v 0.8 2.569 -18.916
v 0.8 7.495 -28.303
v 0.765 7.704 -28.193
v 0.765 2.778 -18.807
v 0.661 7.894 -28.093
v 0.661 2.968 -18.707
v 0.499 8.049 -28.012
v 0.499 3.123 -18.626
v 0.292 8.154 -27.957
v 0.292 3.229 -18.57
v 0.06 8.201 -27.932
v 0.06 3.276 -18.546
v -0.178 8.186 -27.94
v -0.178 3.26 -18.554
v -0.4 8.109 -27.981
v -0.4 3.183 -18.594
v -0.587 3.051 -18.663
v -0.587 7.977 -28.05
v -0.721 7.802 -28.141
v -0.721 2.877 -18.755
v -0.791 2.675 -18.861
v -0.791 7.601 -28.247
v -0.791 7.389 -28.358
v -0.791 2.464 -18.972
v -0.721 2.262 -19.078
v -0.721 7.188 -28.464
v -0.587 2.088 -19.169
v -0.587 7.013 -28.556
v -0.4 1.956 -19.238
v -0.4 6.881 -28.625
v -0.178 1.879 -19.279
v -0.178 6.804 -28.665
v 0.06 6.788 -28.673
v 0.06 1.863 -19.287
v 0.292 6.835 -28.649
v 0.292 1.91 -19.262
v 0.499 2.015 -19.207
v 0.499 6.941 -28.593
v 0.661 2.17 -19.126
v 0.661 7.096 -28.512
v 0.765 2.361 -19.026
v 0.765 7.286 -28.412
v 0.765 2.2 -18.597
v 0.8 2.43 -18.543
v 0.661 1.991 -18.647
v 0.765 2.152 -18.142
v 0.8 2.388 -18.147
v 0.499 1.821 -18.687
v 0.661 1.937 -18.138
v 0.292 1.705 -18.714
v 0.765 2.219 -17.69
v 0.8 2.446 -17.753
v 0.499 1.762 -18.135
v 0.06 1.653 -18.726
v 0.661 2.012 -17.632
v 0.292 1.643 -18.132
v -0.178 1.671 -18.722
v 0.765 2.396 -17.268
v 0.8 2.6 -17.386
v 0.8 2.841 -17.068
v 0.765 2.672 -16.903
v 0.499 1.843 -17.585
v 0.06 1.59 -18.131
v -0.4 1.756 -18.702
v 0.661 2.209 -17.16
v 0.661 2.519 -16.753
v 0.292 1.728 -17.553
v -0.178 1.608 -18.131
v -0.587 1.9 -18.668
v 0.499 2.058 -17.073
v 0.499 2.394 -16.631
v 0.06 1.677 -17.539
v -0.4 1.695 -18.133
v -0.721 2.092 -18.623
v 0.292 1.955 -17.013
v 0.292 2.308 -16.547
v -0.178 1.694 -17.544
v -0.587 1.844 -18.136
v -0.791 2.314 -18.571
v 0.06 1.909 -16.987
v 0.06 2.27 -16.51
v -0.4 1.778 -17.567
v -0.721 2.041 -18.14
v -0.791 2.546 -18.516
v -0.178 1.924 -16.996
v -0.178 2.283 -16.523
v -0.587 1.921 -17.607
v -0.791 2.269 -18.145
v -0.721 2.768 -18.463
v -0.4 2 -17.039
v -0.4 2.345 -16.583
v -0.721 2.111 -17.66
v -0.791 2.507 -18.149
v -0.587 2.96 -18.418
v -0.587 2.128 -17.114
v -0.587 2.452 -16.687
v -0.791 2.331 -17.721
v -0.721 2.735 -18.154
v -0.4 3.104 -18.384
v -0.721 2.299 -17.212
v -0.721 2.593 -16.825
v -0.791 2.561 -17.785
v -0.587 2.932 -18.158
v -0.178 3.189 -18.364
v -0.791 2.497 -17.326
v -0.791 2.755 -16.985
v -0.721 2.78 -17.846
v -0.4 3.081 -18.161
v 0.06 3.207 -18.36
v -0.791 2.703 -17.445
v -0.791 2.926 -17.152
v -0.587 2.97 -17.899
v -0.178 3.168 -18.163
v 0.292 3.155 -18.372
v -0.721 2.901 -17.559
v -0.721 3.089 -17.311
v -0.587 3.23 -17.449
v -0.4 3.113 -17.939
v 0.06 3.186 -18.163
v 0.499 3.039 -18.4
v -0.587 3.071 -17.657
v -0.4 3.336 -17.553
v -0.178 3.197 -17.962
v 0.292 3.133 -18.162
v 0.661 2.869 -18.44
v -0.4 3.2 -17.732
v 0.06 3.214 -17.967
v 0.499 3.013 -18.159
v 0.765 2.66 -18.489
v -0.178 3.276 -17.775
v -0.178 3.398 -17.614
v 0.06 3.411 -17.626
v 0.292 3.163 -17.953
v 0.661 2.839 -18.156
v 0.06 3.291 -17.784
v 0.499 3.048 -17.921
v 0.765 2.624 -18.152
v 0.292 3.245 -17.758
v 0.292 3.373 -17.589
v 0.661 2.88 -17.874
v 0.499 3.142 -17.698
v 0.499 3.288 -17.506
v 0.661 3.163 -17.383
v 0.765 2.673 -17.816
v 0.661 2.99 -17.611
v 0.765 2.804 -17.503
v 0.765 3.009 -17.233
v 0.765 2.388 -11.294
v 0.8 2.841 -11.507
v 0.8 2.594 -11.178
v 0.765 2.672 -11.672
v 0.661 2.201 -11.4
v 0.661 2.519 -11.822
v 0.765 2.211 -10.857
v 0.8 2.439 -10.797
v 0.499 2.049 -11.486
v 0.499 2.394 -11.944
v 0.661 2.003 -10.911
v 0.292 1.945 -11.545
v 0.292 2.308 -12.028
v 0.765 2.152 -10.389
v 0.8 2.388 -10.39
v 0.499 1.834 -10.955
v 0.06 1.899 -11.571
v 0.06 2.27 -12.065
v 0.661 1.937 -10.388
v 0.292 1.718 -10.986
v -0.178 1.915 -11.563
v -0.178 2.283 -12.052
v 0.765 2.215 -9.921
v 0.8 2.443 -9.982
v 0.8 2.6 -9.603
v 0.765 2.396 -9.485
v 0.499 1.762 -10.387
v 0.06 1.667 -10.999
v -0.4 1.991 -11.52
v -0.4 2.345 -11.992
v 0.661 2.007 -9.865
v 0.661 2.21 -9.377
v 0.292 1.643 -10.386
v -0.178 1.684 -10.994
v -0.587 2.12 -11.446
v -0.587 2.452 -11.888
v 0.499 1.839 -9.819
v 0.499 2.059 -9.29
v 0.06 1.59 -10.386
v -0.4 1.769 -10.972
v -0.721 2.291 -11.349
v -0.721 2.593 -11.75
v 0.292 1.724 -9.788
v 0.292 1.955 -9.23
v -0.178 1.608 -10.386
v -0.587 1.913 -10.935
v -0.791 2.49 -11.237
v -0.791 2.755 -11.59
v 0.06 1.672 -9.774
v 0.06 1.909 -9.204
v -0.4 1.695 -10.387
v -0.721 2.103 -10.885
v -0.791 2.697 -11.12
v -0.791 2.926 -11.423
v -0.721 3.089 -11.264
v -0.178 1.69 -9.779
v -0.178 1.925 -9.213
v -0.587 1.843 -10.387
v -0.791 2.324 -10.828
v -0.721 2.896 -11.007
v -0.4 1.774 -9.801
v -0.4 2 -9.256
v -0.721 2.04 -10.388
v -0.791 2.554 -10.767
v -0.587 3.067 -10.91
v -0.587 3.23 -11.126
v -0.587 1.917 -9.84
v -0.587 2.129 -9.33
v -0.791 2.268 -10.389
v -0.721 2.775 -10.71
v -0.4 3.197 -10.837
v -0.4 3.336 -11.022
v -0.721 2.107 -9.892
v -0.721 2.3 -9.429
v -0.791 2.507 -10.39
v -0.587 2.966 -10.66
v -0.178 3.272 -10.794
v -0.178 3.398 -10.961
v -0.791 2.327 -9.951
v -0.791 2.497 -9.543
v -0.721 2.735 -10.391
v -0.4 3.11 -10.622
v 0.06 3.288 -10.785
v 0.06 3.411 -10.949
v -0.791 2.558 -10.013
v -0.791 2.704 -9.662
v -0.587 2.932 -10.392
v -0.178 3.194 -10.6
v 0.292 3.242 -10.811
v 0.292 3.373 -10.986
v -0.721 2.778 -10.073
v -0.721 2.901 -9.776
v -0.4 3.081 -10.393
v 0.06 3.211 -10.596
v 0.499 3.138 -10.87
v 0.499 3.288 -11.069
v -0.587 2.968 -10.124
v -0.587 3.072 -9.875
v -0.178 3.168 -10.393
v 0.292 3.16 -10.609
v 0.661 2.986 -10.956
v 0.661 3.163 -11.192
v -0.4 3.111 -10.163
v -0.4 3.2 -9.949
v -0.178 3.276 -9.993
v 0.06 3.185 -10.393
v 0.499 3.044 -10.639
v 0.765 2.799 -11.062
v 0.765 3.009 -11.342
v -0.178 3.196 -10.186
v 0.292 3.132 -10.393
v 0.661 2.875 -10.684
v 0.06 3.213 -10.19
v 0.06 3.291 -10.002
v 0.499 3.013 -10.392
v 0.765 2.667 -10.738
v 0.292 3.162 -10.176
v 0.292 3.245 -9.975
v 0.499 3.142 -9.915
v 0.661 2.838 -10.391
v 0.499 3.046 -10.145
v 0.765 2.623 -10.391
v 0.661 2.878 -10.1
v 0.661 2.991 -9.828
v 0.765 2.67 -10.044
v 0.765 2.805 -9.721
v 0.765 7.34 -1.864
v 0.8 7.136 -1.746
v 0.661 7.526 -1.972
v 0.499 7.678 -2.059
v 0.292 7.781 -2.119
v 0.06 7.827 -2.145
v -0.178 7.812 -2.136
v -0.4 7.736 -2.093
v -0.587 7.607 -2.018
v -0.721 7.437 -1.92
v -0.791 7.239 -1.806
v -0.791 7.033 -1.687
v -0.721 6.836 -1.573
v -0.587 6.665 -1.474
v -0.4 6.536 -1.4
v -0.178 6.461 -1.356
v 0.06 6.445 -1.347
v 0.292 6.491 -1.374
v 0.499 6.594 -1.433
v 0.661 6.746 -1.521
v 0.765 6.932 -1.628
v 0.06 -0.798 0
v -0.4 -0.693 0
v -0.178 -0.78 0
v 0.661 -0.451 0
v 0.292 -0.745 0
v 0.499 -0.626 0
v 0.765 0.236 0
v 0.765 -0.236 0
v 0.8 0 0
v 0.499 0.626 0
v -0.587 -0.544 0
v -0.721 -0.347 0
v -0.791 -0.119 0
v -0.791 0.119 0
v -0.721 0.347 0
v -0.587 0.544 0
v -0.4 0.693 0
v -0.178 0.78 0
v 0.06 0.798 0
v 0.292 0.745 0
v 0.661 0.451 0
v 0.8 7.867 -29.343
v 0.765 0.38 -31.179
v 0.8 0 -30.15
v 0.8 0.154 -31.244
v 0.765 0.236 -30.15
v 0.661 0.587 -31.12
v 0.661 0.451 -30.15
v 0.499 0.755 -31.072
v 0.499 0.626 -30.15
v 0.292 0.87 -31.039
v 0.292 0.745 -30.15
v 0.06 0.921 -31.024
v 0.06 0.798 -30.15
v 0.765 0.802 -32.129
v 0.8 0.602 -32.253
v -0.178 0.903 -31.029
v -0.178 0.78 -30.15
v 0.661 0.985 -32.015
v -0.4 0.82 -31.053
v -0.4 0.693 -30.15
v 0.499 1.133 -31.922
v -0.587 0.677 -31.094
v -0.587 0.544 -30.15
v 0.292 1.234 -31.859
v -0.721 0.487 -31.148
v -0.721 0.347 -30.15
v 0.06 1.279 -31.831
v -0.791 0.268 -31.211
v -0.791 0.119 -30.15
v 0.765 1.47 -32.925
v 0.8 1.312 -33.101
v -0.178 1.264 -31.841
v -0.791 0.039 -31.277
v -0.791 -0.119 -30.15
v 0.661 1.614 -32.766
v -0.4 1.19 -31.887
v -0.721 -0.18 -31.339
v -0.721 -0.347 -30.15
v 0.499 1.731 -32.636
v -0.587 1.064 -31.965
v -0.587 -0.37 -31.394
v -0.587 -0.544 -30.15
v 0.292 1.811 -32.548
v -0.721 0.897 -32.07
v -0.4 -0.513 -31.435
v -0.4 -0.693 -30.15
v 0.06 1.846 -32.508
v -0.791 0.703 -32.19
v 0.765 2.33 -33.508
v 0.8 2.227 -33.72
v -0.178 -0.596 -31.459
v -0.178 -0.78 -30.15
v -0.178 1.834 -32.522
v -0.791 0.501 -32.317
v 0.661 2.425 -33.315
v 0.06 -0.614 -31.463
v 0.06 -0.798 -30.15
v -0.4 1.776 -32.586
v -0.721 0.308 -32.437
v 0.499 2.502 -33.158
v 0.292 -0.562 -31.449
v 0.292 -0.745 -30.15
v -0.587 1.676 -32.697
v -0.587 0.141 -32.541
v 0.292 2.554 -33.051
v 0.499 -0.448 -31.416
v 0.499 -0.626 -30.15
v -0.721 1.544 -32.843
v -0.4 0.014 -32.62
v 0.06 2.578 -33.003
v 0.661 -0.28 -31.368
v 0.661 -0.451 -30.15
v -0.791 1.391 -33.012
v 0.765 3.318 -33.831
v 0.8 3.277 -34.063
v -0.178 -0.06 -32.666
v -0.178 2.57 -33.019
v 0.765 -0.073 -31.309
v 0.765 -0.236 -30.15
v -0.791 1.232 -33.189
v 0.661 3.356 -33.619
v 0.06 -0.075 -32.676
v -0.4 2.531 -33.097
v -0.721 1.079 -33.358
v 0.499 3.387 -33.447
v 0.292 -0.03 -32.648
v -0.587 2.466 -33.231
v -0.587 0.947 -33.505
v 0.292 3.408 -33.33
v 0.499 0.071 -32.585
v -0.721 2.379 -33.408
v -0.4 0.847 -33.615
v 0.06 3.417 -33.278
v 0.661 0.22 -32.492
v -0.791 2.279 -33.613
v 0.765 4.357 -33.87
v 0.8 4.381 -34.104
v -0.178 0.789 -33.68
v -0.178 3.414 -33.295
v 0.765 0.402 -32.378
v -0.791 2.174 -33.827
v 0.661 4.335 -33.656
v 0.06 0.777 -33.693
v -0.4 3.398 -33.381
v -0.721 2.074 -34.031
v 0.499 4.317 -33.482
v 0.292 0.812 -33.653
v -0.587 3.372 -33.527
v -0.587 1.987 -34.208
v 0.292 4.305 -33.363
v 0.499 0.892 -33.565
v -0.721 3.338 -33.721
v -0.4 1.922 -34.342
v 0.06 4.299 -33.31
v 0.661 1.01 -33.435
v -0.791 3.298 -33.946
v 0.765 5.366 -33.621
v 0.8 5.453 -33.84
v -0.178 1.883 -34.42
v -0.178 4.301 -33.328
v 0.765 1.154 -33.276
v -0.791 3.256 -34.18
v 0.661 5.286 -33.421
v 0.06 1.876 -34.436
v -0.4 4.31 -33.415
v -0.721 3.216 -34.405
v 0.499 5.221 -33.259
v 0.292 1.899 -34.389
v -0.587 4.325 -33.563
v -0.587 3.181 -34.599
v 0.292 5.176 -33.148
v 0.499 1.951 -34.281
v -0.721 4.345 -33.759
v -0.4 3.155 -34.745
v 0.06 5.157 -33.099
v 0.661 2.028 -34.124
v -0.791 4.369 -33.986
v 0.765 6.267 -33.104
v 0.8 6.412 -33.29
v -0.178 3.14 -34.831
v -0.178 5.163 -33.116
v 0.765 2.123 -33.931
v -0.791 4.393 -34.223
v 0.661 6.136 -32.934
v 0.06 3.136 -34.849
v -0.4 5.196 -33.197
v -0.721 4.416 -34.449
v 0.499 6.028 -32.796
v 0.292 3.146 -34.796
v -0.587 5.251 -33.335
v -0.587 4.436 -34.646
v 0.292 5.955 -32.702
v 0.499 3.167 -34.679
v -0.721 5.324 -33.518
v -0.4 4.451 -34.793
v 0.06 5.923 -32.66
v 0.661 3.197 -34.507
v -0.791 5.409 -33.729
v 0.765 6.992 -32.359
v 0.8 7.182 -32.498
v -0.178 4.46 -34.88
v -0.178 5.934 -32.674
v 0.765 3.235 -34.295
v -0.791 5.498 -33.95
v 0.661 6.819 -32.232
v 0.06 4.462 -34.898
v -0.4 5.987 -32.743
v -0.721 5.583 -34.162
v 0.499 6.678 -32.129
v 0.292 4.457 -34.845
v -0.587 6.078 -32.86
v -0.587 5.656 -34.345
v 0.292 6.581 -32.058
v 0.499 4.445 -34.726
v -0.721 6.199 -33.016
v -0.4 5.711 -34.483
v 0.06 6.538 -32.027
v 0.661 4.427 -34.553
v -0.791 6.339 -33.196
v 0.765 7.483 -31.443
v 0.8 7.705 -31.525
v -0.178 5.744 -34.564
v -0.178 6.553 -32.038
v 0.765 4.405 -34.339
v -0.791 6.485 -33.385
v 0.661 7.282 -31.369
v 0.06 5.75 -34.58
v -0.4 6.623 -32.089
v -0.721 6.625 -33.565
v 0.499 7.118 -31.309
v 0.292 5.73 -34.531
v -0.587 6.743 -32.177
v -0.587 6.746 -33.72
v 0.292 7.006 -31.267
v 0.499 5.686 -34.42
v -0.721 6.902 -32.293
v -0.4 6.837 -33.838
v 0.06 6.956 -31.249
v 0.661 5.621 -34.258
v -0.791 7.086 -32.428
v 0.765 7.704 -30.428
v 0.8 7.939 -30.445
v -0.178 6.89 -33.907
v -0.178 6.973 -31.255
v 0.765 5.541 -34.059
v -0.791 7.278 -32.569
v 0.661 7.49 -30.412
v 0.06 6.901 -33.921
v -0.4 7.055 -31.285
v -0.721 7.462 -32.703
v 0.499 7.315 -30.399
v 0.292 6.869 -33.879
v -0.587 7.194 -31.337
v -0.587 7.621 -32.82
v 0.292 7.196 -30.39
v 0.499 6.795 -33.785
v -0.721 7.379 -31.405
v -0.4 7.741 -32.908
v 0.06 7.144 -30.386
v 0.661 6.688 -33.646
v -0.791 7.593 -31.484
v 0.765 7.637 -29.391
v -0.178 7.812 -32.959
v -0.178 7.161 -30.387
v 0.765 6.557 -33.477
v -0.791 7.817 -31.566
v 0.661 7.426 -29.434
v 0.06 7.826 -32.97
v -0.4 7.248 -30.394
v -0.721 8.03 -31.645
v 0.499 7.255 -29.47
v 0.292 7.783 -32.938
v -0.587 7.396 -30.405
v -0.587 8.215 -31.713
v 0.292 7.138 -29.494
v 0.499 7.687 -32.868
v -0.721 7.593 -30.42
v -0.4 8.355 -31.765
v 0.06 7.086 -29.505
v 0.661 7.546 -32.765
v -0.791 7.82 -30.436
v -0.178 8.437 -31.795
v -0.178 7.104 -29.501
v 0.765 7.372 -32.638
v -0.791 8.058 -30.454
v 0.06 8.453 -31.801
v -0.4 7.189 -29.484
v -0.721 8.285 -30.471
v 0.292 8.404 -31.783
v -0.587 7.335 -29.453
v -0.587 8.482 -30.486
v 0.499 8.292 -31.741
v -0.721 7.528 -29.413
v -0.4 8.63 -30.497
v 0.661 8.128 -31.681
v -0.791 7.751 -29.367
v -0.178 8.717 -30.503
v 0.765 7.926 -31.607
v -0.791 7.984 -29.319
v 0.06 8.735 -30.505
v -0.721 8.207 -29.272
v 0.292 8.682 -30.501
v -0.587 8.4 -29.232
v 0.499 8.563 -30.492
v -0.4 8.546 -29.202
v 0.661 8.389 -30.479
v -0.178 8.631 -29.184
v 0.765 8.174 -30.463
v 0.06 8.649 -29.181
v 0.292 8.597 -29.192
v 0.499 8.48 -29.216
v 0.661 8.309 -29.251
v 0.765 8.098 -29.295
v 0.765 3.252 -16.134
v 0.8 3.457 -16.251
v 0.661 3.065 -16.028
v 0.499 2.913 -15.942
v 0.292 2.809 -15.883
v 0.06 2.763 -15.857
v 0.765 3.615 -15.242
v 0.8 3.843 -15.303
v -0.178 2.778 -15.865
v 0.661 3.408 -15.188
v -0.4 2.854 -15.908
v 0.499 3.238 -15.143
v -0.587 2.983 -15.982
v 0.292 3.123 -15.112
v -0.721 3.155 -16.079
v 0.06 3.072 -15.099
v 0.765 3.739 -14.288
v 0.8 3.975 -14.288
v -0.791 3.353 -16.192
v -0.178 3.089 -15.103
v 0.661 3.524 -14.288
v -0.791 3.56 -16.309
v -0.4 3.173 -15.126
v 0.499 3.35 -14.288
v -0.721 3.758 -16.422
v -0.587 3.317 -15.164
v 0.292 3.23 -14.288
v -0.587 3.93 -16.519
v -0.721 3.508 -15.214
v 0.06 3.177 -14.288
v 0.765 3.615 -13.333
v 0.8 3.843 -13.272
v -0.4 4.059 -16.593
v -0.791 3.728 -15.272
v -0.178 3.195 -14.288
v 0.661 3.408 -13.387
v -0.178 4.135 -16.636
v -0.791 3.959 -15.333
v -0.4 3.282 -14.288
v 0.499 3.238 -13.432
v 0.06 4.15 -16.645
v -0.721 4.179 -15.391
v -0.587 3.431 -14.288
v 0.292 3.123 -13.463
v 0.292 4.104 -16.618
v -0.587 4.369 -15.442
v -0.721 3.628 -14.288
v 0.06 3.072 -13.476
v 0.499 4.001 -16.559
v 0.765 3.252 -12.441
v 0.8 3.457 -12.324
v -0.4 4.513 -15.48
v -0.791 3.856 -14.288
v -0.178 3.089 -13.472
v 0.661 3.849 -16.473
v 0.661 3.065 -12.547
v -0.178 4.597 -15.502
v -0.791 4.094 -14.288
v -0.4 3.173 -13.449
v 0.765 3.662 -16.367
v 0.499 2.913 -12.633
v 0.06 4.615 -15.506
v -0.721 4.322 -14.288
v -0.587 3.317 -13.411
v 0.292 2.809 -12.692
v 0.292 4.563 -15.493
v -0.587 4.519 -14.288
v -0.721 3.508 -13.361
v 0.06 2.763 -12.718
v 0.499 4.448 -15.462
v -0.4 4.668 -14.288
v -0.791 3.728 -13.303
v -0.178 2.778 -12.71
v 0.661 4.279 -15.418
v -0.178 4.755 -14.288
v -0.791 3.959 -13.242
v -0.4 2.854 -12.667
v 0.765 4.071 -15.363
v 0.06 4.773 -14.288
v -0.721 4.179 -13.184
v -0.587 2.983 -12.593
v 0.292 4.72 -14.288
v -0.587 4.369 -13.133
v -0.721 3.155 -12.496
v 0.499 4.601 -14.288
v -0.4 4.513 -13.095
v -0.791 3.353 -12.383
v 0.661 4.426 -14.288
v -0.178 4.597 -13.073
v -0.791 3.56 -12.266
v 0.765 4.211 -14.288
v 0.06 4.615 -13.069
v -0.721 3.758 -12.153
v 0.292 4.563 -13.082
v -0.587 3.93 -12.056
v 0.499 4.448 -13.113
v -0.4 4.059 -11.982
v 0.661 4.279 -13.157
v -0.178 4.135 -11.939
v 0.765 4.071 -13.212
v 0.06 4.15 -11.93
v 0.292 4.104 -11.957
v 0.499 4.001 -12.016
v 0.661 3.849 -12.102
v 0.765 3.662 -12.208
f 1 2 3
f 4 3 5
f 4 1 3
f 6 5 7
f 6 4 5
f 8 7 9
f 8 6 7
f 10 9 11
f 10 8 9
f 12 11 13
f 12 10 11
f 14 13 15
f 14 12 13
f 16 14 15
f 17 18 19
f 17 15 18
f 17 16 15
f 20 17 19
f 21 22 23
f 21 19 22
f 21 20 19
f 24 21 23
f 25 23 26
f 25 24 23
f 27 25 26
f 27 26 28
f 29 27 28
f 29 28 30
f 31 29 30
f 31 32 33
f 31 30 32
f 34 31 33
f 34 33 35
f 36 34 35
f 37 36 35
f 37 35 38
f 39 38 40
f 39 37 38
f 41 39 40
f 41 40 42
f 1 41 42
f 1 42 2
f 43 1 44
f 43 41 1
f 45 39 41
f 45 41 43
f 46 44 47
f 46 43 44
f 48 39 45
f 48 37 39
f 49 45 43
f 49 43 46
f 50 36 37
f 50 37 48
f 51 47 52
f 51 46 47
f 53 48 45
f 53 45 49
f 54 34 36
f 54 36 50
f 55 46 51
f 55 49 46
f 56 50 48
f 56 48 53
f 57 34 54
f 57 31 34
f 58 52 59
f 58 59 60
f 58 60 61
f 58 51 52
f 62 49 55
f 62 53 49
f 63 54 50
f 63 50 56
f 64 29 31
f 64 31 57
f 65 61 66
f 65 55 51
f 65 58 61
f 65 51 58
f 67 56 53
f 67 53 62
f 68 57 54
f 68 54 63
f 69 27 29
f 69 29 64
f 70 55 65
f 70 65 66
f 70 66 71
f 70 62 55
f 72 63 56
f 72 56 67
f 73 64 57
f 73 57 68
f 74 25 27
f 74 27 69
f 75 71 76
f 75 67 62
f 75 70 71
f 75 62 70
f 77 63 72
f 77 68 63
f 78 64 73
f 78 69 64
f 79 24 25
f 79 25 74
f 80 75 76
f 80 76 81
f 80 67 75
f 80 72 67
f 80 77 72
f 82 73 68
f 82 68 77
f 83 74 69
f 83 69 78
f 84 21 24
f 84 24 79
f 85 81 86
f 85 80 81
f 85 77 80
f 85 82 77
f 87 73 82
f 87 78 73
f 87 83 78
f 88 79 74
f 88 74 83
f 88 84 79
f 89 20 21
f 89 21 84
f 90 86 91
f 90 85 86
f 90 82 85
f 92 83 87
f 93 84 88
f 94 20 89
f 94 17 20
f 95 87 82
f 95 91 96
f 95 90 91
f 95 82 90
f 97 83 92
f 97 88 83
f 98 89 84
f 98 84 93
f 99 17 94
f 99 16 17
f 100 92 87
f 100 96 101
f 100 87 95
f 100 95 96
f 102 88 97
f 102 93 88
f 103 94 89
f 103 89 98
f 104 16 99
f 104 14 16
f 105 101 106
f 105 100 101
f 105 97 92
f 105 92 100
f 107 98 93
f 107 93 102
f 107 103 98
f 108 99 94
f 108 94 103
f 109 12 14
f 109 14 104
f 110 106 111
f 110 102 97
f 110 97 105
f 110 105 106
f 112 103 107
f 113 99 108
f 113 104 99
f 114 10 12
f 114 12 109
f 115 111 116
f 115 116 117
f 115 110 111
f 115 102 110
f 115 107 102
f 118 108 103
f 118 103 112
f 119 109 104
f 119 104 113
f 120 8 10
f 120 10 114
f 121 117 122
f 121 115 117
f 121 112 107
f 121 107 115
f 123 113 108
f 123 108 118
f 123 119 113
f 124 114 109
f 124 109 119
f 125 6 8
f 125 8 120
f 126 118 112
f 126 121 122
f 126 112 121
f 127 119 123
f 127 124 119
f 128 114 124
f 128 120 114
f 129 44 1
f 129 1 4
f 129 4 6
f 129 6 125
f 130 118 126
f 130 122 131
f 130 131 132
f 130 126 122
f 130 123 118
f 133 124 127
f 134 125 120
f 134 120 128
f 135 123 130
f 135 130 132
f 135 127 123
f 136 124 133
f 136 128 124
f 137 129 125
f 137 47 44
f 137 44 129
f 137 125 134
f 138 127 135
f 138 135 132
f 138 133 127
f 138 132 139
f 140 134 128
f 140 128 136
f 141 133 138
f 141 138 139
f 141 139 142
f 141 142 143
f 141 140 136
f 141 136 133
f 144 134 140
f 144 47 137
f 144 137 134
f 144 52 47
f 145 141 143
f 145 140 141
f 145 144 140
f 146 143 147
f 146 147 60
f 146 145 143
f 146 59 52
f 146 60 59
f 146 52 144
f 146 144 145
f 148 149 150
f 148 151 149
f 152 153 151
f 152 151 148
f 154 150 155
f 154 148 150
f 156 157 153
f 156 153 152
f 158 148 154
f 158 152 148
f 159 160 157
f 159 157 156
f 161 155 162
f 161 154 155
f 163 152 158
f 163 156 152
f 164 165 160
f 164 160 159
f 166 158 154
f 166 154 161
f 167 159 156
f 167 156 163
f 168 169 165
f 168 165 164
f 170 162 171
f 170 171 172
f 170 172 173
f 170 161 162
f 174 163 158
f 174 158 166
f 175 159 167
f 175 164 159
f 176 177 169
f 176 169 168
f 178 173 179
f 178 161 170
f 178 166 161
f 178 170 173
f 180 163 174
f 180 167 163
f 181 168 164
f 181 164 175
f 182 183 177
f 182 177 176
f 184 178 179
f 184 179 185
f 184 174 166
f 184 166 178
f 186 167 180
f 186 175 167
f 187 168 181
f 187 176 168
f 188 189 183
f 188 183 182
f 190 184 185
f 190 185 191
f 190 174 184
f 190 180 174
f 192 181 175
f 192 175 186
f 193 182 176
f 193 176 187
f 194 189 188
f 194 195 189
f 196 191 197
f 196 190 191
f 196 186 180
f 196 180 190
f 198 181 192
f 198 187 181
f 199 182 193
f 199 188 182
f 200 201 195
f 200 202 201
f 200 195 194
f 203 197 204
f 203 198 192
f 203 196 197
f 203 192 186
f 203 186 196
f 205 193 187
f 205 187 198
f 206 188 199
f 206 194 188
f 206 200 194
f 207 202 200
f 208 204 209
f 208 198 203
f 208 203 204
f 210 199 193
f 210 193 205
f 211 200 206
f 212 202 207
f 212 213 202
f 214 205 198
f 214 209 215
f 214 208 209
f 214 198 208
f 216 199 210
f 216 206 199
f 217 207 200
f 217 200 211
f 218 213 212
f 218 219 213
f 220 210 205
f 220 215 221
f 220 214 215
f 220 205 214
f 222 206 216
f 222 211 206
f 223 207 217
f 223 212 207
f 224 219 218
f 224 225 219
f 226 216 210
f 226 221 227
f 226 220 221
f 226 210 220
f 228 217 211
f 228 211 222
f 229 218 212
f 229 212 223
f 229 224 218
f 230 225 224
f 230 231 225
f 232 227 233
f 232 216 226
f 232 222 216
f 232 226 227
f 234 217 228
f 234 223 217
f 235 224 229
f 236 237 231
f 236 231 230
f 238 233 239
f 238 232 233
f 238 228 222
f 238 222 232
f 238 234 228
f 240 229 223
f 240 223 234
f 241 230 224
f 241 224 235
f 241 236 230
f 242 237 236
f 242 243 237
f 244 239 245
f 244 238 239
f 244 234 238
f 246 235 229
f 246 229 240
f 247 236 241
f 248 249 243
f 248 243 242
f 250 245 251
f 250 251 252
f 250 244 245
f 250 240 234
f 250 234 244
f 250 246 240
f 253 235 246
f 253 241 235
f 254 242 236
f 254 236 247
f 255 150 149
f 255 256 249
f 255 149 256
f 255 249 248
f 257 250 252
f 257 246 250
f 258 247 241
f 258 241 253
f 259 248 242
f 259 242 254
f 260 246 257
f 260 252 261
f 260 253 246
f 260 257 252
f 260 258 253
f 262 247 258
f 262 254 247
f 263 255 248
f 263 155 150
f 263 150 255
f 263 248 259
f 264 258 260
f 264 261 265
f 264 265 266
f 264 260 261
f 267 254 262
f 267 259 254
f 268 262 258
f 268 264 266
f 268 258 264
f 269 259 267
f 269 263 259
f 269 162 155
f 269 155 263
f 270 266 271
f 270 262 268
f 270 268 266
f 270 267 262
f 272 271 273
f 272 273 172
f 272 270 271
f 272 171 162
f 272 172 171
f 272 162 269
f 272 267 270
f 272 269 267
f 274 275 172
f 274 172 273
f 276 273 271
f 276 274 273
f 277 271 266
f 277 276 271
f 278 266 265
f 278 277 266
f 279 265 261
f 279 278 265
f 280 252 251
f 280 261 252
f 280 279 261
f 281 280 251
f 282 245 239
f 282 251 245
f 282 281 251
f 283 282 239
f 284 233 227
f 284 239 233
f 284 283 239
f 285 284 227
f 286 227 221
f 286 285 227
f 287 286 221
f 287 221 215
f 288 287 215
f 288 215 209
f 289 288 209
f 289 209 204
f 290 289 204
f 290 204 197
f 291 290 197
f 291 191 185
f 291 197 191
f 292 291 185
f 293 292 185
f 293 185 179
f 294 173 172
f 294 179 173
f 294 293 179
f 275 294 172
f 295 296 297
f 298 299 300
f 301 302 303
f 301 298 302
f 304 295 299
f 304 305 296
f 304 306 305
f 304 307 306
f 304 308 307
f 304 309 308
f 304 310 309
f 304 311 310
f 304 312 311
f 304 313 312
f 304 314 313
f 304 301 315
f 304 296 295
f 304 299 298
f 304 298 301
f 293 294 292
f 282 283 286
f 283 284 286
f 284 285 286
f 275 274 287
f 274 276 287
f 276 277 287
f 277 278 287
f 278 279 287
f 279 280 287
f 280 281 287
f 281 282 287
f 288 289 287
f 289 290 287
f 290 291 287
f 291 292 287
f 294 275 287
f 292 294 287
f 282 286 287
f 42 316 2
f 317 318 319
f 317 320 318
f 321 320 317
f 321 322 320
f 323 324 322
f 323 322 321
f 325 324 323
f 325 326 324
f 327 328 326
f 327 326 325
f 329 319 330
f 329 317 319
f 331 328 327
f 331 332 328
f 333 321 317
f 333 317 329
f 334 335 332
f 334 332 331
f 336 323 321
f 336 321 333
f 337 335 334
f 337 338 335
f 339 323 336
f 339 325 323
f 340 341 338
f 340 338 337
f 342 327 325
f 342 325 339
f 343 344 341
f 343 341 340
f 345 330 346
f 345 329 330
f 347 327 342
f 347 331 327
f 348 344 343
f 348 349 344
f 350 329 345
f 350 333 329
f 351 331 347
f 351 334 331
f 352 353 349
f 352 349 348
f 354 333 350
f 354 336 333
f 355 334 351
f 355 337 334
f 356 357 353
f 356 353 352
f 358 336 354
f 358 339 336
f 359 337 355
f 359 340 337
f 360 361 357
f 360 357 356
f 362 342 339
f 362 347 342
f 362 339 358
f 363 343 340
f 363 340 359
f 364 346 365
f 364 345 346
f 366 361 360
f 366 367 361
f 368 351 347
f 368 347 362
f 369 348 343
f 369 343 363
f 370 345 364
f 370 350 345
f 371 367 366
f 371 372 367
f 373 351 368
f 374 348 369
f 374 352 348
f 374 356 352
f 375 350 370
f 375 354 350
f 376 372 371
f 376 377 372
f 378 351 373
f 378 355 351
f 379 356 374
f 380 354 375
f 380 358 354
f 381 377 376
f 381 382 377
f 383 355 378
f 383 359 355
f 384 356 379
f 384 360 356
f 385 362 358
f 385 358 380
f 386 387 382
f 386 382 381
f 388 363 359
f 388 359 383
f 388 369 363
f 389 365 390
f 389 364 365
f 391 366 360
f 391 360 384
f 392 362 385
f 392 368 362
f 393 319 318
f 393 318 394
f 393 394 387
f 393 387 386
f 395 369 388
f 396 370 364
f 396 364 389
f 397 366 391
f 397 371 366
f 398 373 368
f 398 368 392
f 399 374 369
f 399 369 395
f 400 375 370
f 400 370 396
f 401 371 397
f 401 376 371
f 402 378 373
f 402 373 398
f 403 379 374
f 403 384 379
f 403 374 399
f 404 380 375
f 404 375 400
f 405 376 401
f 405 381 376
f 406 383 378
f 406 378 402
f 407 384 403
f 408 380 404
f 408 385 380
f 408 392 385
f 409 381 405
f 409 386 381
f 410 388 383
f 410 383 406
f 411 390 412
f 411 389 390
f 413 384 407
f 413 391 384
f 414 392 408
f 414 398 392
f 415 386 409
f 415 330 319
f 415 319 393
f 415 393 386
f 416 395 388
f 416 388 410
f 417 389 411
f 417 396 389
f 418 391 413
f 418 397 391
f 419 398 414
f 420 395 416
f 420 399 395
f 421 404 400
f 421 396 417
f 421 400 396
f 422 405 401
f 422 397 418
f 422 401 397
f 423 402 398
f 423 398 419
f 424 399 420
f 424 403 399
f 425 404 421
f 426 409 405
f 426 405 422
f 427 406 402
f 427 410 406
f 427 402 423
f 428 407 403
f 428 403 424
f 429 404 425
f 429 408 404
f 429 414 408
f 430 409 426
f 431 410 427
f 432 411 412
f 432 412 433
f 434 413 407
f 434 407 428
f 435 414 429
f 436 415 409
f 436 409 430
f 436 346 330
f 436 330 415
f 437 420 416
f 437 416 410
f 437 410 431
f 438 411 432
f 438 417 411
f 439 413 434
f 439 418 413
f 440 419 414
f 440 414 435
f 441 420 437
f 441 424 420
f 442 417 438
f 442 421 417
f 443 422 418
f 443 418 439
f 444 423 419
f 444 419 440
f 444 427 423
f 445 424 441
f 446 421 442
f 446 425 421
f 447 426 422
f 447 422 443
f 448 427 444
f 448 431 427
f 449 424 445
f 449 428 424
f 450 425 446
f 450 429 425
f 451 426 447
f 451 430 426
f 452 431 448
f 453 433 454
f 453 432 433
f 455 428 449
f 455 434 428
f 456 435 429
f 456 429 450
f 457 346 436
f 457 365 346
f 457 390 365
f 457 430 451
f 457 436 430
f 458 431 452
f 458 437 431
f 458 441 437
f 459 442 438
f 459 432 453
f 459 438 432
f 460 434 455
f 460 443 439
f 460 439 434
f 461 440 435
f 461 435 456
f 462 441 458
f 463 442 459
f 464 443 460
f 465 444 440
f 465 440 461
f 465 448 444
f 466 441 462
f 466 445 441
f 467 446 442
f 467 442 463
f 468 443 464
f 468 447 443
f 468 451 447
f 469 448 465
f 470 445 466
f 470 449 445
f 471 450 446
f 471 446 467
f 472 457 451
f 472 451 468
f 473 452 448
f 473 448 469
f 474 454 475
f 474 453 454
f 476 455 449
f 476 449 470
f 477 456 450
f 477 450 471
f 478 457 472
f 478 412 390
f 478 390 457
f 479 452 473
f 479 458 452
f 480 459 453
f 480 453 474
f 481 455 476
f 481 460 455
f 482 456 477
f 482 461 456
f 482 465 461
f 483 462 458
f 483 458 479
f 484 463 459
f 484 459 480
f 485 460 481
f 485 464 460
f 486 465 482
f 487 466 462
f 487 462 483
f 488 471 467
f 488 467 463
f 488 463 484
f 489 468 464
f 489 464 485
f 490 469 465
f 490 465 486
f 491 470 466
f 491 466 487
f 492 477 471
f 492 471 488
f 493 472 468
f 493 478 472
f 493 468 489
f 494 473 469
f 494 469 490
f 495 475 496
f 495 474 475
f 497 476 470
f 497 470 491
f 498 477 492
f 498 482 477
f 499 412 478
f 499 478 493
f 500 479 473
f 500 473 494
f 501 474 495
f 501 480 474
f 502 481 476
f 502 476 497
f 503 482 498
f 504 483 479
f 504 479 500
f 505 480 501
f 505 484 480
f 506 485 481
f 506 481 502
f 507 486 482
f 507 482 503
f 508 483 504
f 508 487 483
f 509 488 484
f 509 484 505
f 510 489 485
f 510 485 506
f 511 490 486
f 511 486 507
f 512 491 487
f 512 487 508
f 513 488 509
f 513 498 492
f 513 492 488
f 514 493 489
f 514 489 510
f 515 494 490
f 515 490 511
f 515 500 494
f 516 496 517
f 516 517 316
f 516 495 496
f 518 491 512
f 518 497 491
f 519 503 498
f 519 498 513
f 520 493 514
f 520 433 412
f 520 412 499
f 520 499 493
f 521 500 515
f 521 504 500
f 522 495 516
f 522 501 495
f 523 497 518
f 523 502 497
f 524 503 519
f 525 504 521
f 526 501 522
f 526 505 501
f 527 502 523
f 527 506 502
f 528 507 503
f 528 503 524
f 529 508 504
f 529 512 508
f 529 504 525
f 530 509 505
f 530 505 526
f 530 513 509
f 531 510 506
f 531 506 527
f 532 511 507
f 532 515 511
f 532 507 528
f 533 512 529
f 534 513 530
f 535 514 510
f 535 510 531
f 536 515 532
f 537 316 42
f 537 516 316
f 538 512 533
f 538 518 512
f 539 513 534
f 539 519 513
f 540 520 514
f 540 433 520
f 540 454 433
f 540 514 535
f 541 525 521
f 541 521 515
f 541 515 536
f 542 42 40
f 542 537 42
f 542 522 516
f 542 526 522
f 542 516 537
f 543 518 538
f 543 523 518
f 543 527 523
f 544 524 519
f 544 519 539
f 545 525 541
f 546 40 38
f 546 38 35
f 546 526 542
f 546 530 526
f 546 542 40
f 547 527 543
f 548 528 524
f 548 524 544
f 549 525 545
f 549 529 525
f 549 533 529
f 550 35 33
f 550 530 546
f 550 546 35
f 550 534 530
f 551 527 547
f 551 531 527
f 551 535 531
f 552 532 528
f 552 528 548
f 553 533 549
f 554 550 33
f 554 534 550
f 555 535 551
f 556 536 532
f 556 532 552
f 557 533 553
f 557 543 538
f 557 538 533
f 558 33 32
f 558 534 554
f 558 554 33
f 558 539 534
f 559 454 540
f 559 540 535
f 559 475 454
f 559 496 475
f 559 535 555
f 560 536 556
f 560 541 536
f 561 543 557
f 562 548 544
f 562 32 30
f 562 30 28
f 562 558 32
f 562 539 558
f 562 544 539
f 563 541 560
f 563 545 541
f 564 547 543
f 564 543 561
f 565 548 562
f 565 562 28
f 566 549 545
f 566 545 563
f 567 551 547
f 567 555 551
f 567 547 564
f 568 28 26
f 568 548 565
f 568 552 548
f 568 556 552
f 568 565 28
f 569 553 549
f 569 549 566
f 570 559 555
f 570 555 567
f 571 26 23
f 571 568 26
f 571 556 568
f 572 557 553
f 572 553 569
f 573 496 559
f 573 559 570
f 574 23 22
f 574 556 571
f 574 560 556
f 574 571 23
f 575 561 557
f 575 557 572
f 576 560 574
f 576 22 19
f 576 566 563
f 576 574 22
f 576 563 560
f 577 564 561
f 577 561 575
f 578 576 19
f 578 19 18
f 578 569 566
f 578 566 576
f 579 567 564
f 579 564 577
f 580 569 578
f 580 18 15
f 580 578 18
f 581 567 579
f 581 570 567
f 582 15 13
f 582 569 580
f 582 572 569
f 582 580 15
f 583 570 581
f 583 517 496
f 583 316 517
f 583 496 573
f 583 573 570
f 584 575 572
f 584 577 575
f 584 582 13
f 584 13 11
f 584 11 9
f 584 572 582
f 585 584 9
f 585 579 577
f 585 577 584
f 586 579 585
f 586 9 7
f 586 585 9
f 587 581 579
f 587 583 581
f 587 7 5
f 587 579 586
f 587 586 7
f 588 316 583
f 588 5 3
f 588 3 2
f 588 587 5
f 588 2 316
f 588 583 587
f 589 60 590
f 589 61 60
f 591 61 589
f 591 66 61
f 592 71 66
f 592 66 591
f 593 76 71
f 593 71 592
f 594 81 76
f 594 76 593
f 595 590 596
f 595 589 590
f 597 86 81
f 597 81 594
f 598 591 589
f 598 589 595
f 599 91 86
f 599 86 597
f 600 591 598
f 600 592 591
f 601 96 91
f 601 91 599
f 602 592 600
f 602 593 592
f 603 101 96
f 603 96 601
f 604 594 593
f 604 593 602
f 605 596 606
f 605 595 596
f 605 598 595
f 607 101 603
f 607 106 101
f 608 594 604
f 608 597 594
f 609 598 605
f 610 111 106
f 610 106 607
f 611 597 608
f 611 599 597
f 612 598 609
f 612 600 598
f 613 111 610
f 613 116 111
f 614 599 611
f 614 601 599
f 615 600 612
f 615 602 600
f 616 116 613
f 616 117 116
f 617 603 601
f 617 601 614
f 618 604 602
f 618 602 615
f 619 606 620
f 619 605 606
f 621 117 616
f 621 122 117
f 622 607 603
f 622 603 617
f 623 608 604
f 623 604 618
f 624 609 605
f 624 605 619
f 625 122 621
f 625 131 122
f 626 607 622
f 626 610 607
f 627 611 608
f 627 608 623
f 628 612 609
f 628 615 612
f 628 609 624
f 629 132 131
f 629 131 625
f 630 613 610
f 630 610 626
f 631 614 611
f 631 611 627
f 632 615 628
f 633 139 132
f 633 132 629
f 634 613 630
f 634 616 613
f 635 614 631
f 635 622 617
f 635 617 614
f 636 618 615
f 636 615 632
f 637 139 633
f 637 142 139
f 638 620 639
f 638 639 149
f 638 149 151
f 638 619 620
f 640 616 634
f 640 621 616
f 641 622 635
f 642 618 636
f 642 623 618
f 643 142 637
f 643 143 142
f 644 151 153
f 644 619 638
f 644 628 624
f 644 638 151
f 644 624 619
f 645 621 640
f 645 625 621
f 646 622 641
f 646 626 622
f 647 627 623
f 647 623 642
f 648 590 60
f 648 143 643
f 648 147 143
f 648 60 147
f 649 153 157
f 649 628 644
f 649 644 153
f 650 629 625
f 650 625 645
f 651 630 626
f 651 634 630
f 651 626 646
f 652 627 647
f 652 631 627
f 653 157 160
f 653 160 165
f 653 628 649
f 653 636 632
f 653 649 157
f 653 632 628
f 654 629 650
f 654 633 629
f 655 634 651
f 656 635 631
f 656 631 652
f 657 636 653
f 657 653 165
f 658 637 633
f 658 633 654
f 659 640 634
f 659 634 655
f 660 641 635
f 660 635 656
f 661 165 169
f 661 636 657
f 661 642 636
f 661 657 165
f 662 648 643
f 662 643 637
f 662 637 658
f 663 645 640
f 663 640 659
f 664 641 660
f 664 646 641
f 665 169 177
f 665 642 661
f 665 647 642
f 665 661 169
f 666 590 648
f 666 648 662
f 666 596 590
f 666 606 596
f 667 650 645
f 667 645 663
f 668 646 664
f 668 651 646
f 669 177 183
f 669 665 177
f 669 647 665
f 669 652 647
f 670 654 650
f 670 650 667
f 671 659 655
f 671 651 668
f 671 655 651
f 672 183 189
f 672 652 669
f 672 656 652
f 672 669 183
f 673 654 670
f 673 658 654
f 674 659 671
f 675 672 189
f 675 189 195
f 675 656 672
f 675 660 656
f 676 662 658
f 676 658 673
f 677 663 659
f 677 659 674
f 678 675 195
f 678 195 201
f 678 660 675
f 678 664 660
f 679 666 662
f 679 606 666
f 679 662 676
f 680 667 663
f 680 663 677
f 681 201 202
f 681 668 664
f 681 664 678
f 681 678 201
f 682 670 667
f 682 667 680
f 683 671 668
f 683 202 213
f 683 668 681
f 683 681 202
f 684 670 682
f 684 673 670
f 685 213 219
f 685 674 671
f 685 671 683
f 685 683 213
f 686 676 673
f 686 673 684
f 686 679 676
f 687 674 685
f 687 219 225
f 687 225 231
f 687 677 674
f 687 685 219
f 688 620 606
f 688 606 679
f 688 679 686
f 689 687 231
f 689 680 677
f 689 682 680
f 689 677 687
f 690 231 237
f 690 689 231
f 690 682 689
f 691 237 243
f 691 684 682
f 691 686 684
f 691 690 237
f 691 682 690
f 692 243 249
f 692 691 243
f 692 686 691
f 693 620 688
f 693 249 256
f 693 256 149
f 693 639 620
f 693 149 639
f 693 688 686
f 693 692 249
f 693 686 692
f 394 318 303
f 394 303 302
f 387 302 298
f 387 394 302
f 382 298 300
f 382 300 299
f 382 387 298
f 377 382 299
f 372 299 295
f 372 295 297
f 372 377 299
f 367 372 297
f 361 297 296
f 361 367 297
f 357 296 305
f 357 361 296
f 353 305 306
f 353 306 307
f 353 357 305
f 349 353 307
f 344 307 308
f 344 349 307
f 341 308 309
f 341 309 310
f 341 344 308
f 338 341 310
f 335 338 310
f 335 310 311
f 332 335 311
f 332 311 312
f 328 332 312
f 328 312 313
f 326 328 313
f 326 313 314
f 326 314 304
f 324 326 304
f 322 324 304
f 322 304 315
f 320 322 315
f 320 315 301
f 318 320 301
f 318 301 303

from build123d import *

# Parameters (mm, degrees)
SKETCH1_R = 0.8001


with BuildPart() as part:
    # Sweep1: sweep along a path in Sketch2
    with BuildLine(Plane(origin=(0, 0, 0), x_dir=(0, 0, -1), z_dir=(1, 0, 0))) as sweep1_path:
        Line((0, 0), (30.1498, 0))
        ThreePointArc((30.1498, 0), (34.009420782, 4.926282123), (28.302700663, 7.494992619))
        Line((28.302700663, 7.494992619), (18.916315959, 2.569392085))
        ThreePointArc((18.916315959, 2.569392085), (17.948121595, 2.404428196), (17.068166617, 2.840653653))
        ThreePointArc((17.068166617, 2.840653653), (14.2875, 3.9751), (11.506833383, 2.840653653))
        ThreePointArc((11.506833383, 2.840653653), (10.595153346, 2.400098126), (9.60259352, 2.600284671))
        Line((9.60259352, 2.600284671), (1.74625, 7.136146718))
    # Sketch1 → Sweep1 (sweep)
    with BuildSketch(Plane.XY):
        Circle(SKETCH1_R)
    sweep(path=sweep1_path.line)


solid = part.part
